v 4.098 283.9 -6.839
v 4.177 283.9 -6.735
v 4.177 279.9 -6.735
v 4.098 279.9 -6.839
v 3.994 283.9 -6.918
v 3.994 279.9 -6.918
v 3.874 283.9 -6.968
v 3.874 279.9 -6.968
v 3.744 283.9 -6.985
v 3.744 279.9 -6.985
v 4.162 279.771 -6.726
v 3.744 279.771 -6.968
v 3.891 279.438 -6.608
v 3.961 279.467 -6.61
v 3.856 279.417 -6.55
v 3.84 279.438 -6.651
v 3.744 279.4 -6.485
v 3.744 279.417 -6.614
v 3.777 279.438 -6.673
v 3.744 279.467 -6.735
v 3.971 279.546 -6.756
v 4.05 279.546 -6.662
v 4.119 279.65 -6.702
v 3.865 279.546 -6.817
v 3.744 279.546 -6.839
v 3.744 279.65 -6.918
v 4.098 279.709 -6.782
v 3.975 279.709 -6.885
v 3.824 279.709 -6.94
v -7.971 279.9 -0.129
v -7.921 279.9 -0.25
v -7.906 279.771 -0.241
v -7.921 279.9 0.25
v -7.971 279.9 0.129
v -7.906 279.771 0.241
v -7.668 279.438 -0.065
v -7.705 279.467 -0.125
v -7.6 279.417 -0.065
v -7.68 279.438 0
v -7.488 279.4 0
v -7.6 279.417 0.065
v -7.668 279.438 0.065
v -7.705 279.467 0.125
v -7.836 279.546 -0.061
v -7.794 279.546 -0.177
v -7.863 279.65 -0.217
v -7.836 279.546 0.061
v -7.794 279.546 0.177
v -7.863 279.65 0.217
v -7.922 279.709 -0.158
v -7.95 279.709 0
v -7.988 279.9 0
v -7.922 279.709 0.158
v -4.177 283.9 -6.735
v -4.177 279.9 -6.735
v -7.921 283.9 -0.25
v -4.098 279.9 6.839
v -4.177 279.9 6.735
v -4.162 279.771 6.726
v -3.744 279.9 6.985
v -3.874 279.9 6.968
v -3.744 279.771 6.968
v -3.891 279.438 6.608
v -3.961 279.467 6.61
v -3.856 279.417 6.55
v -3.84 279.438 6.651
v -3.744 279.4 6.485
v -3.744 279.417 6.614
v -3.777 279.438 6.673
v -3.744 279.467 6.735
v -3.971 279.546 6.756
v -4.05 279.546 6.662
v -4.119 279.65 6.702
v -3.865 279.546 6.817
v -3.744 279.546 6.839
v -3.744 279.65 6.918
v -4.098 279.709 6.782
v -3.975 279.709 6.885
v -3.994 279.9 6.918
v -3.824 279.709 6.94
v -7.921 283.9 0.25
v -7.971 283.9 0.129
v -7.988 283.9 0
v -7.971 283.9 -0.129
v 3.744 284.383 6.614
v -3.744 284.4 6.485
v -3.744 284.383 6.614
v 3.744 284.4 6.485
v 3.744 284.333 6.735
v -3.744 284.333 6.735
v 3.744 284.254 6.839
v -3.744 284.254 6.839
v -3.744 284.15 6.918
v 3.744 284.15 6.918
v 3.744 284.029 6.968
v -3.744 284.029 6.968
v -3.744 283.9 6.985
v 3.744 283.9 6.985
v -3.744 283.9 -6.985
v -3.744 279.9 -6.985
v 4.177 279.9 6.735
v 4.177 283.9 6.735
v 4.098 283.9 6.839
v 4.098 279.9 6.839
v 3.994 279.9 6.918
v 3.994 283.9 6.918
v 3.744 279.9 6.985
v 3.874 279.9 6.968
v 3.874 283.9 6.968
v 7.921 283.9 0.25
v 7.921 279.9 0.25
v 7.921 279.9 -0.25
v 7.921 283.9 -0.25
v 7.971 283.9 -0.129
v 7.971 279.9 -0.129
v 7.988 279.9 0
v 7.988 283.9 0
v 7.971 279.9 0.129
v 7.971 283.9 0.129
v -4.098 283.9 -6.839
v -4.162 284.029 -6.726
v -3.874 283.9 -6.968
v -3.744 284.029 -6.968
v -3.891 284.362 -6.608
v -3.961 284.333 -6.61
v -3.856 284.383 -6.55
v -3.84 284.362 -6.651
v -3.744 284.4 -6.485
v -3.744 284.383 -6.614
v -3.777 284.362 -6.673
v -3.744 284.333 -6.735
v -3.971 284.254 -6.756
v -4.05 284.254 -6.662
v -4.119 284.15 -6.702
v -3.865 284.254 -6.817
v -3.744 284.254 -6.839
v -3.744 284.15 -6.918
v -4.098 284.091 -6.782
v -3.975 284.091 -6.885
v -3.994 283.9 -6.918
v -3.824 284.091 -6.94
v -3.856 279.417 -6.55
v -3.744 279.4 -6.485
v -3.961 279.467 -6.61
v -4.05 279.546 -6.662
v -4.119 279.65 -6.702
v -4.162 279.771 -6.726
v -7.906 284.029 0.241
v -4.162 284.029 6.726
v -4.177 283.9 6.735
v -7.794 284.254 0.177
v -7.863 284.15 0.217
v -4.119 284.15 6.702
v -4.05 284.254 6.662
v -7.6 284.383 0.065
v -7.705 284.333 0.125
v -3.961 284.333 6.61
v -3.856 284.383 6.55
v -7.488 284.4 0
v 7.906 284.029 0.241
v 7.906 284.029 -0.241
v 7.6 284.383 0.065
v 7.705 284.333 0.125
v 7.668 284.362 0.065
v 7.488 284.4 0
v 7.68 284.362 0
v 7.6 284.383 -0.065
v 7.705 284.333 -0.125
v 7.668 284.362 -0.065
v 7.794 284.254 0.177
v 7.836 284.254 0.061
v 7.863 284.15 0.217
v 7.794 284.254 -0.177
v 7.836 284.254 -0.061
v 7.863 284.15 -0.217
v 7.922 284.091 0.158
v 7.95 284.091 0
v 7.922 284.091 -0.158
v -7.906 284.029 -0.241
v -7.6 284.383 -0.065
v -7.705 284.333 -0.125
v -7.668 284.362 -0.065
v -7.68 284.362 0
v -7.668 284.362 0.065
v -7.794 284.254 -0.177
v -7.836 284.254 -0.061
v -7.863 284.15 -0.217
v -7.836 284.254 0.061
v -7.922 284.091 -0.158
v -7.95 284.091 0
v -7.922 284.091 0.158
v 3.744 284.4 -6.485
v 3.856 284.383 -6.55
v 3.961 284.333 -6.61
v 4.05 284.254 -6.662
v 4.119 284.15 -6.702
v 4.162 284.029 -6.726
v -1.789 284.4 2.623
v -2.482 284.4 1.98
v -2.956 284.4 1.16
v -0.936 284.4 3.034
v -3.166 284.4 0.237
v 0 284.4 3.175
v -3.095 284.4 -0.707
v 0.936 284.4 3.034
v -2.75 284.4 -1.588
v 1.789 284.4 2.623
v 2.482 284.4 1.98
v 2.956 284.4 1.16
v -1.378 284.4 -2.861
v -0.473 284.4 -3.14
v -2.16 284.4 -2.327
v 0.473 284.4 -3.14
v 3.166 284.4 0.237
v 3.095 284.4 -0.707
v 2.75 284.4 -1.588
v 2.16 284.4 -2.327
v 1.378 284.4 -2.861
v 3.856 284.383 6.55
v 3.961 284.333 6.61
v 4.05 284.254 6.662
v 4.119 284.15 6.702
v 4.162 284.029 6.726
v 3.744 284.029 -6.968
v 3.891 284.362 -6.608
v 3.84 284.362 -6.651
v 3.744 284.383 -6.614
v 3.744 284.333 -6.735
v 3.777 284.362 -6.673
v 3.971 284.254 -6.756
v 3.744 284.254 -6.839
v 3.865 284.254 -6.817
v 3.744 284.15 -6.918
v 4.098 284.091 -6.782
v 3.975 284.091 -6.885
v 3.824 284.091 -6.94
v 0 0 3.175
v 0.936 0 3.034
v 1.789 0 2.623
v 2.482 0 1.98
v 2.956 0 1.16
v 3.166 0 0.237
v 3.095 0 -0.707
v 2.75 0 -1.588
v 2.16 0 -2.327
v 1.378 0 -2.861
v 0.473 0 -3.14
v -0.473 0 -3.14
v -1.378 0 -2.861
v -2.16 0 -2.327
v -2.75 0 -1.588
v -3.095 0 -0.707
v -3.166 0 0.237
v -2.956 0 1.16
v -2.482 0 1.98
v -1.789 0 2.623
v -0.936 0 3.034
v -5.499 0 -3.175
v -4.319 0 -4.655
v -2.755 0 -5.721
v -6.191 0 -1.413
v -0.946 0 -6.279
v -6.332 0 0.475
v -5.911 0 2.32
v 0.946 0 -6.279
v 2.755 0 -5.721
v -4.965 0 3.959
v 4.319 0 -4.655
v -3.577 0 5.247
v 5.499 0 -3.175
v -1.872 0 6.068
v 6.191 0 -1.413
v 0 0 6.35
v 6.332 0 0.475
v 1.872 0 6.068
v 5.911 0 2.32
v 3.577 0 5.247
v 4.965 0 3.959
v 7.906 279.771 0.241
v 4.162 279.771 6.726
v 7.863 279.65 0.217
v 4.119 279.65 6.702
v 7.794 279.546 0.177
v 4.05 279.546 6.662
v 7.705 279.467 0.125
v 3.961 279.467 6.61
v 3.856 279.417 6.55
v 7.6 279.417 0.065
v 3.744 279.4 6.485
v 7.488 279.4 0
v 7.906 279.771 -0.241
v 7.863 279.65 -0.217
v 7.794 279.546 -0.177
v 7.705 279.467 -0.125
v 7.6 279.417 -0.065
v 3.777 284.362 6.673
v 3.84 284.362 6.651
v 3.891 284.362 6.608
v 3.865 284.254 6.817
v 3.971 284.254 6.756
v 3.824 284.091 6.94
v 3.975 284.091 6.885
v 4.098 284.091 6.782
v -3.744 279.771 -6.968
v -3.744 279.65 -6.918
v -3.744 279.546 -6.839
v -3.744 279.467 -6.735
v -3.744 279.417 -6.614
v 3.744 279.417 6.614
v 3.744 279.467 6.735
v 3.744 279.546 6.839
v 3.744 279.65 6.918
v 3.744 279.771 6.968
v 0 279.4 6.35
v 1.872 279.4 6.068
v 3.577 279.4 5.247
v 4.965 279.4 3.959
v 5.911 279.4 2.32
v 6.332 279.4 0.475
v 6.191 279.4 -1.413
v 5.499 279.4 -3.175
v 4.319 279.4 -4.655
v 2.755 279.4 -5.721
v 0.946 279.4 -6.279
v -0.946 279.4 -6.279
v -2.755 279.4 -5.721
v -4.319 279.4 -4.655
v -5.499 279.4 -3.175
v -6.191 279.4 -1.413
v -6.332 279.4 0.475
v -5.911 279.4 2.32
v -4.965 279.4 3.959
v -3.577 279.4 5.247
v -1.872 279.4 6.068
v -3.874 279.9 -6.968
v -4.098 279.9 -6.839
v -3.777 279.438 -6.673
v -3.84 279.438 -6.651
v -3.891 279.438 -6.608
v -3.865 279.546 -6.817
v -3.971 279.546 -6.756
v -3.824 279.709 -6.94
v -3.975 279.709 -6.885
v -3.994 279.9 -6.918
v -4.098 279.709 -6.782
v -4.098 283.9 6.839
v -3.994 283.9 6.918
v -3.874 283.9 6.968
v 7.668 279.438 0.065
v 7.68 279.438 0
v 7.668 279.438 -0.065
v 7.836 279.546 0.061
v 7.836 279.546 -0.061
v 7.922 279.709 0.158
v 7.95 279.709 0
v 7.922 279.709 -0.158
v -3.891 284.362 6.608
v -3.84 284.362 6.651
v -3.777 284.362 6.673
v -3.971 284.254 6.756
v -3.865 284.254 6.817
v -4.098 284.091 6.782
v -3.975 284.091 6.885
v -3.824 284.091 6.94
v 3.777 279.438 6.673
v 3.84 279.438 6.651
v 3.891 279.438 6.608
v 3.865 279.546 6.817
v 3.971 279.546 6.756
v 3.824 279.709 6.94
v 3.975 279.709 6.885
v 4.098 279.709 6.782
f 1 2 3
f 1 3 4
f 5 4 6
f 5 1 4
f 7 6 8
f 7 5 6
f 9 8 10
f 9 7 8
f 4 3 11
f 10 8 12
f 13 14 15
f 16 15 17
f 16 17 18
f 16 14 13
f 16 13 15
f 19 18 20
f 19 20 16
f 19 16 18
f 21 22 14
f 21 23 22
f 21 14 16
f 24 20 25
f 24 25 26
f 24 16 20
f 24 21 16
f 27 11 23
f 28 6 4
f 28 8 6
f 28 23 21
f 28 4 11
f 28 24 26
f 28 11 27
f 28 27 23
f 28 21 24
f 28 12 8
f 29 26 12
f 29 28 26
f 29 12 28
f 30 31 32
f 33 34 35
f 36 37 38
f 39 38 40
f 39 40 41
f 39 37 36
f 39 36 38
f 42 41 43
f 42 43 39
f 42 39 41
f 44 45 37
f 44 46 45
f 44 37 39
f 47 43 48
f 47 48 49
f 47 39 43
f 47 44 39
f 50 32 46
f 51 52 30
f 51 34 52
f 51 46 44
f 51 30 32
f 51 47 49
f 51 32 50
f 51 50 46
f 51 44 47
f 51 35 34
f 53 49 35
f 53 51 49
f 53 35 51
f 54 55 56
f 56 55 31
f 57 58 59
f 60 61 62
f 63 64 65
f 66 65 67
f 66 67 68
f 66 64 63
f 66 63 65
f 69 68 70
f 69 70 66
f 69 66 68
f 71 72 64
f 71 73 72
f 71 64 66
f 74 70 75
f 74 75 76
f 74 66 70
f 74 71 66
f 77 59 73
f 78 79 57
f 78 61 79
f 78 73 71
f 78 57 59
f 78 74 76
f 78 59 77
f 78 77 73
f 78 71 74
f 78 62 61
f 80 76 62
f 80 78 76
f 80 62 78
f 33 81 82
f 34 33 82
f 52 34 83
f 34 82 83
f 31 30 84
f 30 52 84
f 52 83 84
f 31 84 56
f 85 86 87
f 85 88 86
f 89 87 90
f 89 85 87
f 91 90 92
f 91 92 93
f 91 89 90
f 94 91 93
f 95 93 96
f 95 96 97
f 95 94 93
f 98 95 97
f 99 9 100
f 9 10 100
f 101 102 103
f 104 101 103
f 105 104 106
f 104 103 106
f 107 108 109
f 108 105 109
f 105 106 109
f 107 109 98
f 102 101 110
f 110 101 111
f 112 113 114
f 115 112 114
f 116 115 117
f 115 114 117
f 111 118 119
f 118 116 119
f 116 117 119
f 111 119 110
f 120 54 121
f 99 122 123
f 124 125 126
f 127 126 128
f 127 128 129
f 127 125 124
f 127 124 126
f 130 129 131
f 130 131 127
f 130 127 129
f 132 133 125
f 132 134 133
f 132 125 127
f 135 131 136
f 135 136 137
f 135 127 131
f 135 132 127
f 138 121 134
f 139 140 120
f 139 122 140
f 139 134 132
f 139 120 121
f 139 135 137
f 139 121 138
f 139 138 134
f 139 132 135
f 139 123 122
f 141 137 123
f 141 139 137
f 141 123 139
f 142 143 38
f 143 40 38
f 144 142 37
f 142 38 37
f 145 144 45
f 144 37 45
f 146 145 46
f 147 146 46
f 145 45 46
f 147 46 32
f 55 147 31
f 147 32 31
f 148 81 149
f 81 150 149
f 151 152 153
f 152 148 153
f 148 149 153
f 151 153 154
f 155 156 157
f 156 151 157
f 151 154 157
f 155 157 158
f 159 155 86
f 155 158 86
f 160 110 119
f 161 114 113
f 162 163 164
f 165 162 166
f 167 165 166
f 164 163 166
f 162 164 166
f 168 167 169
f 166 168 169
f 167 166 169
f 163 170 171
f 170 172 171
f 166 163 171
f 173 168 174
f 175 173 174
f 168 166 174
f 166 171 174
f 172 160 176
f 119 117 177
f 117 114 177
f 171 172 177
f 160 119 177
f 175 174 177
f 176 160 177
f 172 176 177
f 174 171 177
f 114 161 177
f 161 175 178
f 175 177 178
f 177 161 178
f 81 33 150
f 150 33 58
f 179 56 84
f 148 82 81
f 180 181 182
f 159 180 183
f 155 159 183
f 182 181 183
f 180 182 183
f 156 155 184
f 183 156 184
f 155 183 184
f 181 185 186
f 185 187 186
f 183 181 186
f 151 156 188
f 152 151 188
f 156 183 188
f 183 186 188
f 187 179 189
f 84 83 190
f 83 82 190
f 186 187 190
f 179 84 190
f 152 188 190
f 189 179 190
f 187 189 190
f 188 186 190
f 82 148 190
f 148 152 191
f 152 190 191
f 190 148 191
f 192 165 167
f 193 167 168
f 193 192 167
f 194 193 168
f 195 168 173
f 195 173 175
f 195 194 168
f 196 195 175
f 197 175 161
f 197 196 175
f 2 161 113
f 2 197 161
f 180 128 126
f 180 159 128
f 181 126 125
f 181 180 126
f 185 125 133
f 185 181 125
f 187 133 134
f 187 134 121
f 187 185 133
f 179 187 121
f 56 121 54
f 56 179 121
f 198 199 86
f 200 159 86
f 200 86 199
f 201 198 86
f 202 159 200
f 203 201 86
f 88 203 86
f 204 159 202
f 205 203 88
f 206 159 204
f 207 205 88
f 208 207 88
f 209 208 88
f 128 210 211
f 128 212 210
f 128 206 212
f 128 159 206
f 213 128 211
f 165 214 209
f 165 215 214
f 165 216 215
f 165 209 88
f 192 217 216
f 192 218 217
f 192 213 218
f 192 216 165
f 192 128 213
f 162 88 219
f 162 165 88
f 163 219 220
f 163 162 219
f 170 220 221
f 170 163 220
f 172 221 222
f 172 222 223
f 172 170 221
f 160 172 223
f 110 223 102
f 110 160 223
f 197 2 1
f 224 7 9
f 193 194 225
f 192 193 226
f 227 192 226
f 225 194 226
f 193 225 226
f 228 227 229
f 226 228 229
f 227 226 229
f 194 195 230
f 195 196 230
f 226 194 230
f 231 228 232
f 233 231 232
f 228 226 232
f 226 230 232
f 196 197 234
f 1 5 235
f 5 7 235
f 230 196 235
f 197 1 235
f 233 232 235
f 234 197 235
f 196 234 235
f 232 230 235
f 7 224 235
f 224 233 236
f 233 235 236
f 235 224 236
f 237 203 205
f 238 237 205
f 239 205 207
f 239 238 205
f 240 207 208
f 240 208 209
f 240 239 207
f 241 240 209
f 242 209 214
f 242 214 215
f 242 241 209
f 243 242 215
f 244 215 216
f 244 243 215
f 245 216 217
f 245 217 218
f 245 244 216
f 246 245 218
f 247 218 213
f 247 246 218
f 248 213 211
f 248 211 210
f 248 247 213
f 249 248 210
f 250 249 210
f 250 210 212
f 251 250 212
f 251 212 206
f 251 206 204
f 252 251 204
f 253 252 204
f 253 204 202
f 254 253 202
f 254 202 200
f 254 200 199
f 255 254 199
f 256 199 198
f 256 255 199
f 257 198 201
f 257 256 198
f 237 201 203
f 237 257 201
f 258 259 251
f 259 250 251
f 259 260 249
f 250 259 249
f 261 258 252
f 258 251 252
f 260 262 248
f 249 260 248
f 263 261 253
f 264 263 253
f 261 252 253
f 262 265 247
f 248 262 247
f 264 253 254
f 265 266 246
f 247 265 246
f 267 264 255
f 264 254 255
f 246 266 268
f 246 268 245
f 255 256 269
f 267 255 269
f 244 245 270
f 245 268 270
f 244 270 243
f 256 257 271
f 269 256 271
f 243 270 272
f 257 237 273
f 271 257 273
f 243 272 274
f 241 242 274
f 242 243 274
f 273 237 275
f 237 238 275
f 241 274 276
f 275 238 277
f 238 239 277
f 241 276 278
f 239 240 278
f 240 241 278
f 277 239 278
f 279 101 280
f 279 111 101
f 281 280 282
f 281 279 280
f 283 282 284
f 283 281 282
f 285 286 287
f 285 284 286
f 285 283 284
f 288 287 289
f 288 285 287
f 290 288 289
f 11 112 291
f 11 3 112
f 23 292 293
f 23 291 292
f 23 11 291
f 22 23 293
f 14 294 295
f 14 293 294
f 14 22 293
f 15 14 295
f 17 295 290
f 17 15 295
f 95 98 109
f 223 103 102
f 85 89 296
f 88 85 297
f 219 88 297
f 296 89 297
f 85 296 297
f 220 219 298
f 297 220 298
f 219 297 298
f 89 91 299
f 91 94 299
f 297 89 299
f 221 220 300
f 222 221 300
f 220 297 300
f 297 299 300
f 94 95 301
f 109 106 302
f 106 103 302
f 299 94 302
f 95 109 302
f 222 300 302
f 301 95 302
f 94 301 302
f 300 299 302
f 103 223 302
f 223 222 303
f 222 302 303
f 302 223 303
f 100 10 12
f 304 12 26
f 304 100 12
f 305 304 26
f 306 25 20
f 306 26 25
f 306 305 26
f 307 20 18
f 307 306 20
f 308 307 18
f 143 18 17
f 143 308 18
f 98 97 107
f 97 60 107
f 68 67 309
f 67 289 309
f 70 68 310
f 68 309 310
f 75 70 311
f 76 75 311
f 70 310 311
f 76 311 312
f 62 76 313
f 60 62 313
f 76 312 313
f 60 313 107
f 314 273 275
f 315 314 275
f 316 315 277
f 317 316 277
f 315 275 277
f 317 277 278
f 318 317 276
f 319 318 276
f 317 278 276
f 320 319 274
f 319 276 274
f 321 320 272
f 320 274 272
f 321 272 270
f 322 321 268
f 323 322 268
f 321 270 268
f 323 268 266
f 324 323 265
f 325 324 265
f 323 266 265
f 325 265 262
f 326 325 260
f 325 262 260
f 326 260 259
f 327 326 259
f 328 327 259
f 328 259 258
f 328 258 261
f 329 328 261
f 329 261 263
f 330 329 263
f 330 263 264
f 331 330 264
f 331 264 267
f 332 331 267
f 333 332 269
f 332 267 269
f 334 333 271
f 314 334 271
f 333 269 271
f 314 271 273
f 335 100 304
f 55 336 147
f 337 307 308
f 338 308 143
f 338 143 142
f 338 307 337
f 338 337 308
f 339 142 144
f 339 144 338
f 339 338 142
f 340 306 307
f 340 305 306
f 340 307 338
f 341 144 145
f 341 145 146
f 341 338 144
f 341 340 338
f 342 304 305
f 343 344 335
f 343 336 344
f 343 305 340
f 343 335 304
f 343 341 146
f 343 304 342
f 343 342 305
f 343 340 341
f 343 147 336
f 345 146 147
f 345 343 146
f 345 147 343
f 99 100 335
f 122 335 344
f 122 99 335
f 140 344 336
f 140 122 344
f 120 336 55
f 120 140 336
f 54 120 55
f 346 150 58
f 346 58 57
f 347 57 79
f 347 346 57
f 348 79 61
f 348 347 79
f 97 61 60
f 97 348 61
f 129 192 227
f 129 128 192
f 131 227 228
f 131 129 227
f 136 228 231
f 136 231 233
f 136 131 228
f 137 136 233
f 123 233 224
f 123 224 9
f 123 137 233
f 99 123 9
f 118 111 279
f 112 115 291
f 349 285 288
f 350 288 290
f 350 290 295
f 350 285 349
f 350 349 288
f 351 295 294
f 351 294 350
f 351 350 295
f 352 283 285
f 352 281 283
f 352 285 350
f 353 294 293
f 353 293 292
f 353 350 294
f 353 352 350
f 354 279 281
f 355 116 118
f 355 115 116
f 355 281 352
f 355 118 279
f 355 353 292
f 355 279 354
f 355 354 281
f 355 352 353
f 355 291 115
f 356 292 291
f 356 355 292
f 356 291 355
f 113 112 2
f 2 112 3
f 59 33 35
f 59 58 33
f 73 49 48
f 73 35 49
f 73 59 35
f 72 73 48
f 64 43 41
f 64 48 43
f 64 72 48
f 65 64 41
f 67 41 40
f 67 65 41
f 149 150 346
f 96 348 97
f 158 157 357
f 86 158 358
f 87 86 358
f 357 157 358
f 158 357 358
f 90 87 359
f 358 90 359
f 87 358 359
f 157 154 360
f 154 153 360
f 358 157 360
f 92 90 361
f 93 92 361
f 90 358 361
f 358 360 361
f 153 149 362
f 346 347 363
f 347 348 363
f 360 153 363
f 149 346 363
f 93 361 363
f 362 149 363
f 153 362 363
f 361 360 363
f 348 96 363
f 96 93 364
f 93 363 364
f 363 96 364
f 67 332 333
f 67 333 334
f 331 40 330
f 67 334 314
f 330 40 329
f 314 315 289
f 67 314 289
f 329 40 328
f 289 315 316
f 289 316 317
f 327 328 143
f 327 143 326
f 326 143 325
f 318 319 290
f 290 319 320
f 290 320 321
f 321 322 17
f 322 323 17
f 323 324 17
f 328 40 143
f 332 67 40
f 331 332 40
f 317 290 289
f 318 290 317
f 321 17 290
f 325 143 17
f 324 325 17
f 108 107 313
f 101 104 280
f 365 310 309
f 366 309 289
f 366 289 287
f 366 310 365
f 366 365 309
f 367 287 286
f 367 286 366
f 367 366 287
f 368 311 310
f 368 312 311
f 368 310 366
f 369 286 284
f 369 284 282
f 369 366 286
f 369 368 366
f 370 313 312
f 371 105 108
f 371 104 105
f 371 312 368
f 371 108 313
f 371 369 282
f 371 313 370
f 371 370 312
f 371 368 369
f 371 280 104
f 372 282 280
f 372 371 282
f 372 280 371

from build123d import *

# Parameters (mm, degrees)
SKETCH1_R           = 6.35
SKETCH1_R_2         = 3.175
BOSS_EXTRUDE1_DEPTH = 279.4
SKETCH2_R           = 3.175
BOSS_EXTRUDE2_DEPTH = 5
FILLET1_R           = 0.5


with BuildPart() as part:
    # Sketch1 → Boss-Extrude1 (new body)
    with BuildSketch(Plane(origin=(0, 0, 0), x_dir=(1, 0, 0), z_dir=(0, 1, 0))):
        with Locations(Location((0, 0, 0), (0, 0, 270))):
            Circle(SKETCH1_R)
        with Locations(Location((0, 0, 0), (0, 0, 270))):
            Circle(SKETCH1_R_2, mode=Mode.SUBTRACT)
    extrude(amount=BOSS_EXTRUDE1_DEPTH)

    # Sketch2 → Boss-Extrude2 (add)
    with BuildSketch(Plane(origin=(0, 279.4, 0), x_dir=(1, 0, 0), z_dir=(0, 1, 0))):
        Polygon((-8.065583261, 0), (-4.03279163, -6.985), (4.03279163, -6.985), (8.065583261, 0), (4.03279163, 6.985), (-4.03279163, 6.985), align=None)
        with Locations(Location((0, 0, 0), (0, 0, 270))):
            Circle(SKETCH2_R, mode=Mode.SUBTRACT)
    extrude(amount=BOSS_EXTRUDE2_DEPTH)

    # Fillet1
    fillet1_edges = [part.edges().sort_by_distance(p)[0] for p in [
        (-6.049187445, 284.4, -3.4925),
        (-6.049187445, 284.4, 3.4925),
        (0, 284.4, 6.985),
        (6.049187445, 284.4, 3.4925),
        (6.049187445, 284.4, -3.4925),
        (0, 284.4, -6.985),
        (-6.049187445, 279.4, -3.4925),
        (-4.03279163, 281.9, -6.985),
        (-6.049187445, 279.4, 3.4925),
        (-8.065583261, 281.9, 0),
        (0, 279.4, 6.985),
        (-4.03279163, 281.9, 6.985),
        (6.049187445, 279.4, 3.4925),
        (4.03279163, 281.9, 6.985),
        (6.049187445, 279.4, -3.4925),
        (8.065583261, 281.9, 0),
        (0, 279.4, -6.985),
        (4.03279163, 281.9, -6.985),
    ]]
    fillet(fillet1_edges, radius=FILLET1_R)


solid = part.part
